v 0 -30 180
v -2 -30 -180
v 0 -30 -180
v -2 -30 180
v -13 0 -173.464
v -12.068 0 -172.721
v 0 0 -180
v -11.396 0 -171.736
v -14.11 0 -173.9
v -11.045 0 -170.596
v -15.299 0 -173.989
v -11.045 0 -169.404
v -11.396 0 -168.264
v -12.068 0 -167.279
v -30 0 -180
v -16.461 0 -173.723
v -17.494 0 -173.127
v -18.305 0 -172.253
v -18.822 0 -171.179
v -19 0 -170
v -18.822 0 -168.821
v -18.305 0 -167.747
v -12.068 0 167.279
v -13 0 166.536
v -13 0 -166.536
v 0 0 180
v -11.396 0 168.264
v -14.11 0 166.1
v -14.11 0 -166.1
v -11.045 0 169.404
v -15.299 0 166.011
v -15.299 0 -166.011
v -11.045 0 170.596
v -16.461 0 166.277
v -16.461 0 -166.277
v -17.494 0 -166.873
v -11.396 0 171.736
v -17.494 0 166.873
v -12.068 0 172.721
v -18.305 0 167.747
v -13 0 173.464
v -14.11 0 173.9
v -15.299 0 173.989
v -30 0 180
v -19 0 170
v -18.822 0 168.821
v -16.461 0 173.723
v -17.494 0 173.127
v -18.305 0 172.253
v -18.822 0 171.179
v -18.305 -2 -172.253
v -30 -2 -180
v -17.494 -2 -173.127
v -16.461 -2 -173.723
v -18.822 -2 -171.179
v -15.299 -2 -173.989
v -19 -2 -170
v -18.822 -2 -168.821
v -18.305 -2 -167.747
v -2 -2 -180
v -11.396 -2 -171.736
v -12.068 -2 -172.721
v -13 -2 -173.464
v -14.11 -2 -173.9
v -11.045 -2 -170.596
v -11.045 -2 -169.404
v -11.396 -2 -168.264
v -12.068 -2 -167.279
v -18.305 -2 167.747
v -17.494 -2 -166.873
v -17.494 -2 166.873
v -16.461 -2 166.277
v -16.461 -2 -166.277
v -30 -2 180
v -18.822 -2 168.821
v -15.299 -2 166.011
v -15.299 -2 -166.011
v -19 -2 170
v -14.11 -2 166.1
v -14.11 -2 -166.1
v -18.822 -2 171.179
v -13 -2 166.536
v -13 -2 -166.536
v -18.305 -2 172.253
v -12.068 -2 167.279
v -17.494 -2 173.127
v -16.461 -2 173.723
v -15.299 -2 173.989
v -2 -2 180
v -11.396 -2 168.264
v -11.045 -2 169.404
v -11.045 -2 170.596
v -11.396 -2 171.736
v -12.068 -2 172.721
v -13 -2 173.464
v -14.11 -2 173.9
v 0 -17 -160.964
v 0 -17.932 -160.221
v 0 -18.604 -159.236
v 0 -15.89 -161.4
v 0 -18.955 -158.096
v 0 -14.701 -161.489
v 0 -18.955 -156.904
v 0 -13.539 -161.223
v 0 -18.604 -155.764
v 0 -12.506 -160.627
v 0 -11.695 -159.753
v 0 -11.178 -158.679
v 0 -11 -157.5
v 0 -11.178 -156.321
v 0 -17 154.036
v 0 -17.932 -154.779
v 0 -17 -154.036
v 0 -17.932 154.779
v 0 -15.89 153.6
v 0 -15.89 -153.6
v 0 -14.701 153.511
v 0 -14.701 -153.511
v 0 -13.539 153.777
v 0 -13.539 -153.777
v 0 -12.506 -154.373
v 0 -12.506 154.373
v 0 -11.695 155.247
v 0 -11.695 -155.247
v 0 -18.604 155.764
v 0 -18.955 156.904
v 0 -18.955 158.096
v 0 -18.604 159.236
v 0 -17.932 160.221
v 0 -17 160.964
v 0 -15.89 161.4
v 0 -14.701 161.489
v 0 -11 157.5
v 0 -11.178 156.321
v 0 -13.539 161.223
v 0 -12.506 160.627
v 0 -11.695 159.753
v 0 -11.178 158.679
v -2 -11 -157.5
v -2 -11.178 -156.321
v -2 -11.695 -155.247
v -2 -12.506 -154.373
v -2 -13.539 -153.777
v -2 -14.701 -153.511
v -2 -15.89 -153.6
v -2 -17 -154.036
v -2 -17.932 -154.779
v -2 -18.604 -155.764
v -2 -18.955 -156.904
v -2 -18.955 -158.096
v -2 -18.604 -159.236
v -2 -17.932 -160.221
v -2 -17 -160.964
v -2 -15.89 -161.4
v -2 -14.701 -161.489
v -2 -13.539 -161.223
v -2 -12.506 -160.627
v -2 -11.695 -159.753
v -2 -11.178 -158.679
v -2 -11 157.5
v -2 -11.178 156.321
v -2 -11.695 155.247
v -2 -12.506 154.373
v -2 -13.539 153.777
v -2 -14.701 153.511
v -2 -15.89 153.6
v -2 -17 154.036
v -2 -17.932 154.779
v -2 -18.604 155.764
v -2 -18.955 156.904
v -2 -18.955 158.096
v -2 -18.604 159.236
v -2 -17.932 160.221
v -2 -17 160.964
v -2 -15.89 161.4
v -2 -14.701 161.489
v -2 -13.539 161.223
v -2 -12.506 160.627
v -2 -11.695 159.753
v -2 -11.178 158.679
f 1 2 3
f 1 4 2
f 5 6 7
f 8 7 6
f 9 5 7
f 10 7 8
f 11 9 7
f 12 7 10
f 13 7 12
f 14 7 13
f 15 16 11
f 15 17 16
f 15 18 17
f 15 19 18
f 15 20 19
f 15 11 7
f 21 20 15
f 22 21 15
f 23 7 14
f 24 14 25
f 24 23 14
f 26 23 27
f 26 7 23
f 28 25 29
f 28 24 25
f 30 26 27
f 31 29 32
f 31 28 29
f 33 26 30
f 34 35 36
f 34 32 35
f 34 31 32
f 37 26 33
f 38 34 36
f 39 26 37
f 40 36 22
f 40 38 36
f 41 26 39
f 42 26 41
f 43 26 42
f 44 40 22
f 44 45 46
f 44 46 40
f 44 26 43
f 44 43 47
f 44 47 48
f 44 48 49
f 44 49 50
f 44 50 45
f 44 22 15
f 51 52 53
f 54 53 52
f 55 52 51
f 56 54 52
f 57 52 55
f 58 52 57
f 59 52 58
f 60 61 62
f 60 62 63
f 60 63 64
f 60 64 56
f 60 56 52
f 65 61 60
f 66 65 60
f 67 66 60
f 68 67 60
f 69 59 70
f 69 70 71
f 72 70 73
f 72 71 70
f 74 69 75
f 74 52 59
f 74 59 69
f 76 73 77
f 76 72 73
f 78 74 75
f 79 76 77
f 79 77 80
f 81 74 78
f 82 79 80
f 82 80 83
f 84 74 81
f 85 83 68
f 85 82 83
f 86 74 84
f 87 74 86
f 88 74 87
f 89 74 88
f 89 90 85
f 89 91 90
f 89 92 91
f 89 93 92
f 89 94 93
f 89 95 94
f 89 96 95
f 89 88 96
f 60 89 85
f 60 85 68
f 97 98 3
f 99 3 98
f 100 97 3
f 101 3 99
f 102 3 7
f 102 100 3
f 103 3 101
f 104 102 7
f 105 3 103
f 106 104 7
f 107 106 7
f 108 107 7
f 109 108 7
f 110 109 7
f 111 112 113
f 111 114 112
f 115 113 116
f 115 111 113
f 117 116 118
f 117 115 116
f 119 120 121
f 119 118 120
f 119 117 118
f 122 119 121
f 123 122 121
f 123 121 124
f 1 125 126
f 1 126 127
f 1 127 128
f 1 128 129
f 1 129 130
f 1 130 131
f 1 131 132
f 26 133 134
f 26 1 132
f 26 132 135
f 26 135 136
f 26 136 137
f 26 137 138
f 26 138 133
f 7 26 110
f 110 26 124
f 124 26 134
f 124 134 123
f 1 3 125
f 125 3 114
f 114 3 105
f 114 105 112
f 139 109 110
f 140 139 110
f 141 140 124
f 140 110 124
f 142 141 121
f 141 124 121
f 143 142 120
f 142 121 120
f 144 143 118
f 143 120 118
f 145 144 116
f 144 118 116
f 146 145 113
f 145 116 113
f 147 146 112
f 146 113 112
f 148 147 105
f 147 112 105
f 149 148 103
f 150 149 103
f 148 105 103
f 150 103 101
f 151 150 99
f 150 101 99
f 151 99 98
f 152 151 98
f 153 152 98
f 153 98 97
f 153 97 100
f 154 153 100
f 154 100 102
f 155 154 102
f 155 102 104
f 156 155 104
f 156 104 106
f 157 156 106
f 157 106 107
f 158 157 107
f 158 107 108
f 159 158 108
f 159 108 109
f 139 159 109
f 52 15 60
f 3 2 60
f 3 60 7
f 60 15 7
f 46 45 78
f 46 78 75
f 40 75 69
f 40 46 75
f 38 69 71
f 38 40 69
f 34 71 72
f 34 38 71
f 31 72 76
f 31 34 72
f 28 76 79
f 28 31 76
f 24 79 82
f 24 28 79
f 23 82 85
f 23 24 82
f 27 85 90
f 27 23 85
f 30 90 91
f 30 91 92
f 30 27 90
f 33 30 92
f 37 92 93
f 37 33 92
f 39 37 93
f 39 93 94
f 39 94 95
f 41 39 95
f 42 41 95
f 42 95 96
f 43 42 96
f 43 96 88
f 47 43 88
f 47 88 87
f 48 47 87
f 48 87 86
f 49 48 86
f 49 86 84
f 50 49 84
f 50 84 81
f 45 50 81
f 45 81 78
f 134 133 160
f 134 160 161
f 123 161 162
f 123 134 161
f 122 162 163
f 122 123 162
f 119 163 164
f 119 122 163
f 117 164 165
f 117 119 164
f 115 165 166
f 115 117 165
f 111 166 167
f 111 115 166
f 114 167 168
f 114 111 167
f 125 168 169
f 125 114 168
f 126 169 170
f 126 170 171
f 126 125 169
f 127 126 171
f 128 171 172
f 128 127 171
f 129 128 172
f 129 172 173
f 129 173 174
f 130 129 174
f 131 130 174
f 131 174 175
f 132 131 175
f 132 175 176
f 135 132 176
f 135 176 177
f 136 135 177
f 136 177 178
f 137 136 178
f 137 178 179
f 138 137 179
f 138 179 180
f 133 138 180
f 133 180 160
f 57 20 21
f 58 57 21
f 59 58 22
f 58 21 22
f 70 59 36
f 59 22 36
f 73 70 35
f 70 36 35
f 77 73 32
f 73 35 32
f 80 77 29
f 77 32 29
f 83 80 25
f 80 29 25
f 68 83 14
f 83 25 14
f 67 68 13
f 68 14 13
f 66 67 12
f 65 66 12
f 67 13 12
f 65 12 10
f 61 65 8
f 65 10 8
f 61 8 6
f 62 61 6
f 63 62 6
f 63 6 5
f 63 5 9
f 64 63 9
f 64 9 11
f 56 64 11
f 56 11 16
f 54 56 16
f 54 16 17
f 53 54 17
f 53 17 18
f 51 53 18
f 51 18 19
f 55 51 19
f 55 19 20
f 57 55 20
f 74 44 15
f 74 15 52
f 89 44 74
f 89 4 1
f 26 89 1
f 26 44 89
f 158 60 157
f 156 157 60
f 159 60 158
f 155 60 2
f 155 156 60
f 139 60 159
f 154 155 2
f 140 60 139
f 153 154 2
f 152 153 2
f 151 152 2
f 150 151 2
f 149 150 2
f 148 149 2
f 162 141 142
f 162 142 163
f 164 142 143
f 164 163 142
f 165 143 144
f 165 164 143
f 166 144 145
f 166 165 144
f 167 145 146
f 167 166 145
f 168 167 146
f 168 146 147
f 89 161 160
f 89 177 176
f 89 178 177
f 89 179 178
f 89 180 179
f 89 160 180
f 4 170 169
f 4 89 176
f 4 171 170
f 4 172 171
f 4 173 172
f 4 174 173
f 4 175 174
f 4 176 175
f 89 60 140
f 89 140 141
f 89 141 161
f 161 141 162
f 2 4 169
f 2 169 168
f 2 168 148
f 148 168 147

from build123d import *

# Parameters (mm, degrees)
BOSS_EXTRUDE1_DEPTH = 180
CUT_EXTRUDE1_REACH  = 186.932
SKETCH2_R           = 4
CUT_EXTRUDE2_REACH  = 186.932
SKETCH3_R           = 4


with BuildPart() as part:
    # Sketch1 → Boss-Extrude1 (new, symmetric)
    with BuildSketch(Plane.XY):
        Polygon((0, 0), (-30, 0), (-30, -2), (-2, -2), (-2, -30), (0, -30), align=None)
    extrude(amount=BOSS_EXTRUDE1_DEPTH, both=True)

    # Sketch2 → Cut-Extrude1 (cut, up to next)
    with BuildSketch(Plane(origin=(0, 0, 0), x_dir=(1, 0, 0), z_dir=(0, 1, 0)), mode=Mode.PRIVATE) as cut_extrude1_sk1:
        with Locations((-15, 170)):
            Circle(SKETCH2_R)
    cut_extrude1_tool1 = extrude(cut_extrude1_sk1.sketch, amount=-CUT_EXTRUDE1_REACH, mode=Mode.PRIVATE) & part.part
    cut_extrude1 = cut_extrude1_tool1.solids().sort_by_distance((-15, 0, -170))[0]
    add(cut_extrude1, mode=Mode.SUBTRACT)

    # Sketch3 → Cut-Extrude2 (cut, up to next)
    with BuildSketch(Plane(origin=(0, 0, 0), x_dir=(0, 0, -1), z_dir=(1, 0, 0)), mode=Mode.PRIVATE) as cut_extrude2_sk1:
        with Locations((157.5, -15)):
            Circle(SKETCH3_R)
    cut_extrude2_tool1 = extrude(cut_extrude2_sk1.sketch, amount=-CUT_EXTRUDE2_REACH, mode=Mode.PRIVATE) & part.part
    cut_extrude2 = cut_extrude2_tool1.solids().sort_by_distance((0, -15, -157.5))[0]
    add(cut_extrude2, mode=Mode.SUBTRACT)

    # Mirror1: Cut-Extrude1, Cut-Extrude2 across plane
    add(cut_extrude1.mirror(Plane.XY), mode=Mode.SUBTRACT)
    add(cut_extrude2.mirror(Plane.XY), mode=Mode.SUBTRACT)


solid = part.part
